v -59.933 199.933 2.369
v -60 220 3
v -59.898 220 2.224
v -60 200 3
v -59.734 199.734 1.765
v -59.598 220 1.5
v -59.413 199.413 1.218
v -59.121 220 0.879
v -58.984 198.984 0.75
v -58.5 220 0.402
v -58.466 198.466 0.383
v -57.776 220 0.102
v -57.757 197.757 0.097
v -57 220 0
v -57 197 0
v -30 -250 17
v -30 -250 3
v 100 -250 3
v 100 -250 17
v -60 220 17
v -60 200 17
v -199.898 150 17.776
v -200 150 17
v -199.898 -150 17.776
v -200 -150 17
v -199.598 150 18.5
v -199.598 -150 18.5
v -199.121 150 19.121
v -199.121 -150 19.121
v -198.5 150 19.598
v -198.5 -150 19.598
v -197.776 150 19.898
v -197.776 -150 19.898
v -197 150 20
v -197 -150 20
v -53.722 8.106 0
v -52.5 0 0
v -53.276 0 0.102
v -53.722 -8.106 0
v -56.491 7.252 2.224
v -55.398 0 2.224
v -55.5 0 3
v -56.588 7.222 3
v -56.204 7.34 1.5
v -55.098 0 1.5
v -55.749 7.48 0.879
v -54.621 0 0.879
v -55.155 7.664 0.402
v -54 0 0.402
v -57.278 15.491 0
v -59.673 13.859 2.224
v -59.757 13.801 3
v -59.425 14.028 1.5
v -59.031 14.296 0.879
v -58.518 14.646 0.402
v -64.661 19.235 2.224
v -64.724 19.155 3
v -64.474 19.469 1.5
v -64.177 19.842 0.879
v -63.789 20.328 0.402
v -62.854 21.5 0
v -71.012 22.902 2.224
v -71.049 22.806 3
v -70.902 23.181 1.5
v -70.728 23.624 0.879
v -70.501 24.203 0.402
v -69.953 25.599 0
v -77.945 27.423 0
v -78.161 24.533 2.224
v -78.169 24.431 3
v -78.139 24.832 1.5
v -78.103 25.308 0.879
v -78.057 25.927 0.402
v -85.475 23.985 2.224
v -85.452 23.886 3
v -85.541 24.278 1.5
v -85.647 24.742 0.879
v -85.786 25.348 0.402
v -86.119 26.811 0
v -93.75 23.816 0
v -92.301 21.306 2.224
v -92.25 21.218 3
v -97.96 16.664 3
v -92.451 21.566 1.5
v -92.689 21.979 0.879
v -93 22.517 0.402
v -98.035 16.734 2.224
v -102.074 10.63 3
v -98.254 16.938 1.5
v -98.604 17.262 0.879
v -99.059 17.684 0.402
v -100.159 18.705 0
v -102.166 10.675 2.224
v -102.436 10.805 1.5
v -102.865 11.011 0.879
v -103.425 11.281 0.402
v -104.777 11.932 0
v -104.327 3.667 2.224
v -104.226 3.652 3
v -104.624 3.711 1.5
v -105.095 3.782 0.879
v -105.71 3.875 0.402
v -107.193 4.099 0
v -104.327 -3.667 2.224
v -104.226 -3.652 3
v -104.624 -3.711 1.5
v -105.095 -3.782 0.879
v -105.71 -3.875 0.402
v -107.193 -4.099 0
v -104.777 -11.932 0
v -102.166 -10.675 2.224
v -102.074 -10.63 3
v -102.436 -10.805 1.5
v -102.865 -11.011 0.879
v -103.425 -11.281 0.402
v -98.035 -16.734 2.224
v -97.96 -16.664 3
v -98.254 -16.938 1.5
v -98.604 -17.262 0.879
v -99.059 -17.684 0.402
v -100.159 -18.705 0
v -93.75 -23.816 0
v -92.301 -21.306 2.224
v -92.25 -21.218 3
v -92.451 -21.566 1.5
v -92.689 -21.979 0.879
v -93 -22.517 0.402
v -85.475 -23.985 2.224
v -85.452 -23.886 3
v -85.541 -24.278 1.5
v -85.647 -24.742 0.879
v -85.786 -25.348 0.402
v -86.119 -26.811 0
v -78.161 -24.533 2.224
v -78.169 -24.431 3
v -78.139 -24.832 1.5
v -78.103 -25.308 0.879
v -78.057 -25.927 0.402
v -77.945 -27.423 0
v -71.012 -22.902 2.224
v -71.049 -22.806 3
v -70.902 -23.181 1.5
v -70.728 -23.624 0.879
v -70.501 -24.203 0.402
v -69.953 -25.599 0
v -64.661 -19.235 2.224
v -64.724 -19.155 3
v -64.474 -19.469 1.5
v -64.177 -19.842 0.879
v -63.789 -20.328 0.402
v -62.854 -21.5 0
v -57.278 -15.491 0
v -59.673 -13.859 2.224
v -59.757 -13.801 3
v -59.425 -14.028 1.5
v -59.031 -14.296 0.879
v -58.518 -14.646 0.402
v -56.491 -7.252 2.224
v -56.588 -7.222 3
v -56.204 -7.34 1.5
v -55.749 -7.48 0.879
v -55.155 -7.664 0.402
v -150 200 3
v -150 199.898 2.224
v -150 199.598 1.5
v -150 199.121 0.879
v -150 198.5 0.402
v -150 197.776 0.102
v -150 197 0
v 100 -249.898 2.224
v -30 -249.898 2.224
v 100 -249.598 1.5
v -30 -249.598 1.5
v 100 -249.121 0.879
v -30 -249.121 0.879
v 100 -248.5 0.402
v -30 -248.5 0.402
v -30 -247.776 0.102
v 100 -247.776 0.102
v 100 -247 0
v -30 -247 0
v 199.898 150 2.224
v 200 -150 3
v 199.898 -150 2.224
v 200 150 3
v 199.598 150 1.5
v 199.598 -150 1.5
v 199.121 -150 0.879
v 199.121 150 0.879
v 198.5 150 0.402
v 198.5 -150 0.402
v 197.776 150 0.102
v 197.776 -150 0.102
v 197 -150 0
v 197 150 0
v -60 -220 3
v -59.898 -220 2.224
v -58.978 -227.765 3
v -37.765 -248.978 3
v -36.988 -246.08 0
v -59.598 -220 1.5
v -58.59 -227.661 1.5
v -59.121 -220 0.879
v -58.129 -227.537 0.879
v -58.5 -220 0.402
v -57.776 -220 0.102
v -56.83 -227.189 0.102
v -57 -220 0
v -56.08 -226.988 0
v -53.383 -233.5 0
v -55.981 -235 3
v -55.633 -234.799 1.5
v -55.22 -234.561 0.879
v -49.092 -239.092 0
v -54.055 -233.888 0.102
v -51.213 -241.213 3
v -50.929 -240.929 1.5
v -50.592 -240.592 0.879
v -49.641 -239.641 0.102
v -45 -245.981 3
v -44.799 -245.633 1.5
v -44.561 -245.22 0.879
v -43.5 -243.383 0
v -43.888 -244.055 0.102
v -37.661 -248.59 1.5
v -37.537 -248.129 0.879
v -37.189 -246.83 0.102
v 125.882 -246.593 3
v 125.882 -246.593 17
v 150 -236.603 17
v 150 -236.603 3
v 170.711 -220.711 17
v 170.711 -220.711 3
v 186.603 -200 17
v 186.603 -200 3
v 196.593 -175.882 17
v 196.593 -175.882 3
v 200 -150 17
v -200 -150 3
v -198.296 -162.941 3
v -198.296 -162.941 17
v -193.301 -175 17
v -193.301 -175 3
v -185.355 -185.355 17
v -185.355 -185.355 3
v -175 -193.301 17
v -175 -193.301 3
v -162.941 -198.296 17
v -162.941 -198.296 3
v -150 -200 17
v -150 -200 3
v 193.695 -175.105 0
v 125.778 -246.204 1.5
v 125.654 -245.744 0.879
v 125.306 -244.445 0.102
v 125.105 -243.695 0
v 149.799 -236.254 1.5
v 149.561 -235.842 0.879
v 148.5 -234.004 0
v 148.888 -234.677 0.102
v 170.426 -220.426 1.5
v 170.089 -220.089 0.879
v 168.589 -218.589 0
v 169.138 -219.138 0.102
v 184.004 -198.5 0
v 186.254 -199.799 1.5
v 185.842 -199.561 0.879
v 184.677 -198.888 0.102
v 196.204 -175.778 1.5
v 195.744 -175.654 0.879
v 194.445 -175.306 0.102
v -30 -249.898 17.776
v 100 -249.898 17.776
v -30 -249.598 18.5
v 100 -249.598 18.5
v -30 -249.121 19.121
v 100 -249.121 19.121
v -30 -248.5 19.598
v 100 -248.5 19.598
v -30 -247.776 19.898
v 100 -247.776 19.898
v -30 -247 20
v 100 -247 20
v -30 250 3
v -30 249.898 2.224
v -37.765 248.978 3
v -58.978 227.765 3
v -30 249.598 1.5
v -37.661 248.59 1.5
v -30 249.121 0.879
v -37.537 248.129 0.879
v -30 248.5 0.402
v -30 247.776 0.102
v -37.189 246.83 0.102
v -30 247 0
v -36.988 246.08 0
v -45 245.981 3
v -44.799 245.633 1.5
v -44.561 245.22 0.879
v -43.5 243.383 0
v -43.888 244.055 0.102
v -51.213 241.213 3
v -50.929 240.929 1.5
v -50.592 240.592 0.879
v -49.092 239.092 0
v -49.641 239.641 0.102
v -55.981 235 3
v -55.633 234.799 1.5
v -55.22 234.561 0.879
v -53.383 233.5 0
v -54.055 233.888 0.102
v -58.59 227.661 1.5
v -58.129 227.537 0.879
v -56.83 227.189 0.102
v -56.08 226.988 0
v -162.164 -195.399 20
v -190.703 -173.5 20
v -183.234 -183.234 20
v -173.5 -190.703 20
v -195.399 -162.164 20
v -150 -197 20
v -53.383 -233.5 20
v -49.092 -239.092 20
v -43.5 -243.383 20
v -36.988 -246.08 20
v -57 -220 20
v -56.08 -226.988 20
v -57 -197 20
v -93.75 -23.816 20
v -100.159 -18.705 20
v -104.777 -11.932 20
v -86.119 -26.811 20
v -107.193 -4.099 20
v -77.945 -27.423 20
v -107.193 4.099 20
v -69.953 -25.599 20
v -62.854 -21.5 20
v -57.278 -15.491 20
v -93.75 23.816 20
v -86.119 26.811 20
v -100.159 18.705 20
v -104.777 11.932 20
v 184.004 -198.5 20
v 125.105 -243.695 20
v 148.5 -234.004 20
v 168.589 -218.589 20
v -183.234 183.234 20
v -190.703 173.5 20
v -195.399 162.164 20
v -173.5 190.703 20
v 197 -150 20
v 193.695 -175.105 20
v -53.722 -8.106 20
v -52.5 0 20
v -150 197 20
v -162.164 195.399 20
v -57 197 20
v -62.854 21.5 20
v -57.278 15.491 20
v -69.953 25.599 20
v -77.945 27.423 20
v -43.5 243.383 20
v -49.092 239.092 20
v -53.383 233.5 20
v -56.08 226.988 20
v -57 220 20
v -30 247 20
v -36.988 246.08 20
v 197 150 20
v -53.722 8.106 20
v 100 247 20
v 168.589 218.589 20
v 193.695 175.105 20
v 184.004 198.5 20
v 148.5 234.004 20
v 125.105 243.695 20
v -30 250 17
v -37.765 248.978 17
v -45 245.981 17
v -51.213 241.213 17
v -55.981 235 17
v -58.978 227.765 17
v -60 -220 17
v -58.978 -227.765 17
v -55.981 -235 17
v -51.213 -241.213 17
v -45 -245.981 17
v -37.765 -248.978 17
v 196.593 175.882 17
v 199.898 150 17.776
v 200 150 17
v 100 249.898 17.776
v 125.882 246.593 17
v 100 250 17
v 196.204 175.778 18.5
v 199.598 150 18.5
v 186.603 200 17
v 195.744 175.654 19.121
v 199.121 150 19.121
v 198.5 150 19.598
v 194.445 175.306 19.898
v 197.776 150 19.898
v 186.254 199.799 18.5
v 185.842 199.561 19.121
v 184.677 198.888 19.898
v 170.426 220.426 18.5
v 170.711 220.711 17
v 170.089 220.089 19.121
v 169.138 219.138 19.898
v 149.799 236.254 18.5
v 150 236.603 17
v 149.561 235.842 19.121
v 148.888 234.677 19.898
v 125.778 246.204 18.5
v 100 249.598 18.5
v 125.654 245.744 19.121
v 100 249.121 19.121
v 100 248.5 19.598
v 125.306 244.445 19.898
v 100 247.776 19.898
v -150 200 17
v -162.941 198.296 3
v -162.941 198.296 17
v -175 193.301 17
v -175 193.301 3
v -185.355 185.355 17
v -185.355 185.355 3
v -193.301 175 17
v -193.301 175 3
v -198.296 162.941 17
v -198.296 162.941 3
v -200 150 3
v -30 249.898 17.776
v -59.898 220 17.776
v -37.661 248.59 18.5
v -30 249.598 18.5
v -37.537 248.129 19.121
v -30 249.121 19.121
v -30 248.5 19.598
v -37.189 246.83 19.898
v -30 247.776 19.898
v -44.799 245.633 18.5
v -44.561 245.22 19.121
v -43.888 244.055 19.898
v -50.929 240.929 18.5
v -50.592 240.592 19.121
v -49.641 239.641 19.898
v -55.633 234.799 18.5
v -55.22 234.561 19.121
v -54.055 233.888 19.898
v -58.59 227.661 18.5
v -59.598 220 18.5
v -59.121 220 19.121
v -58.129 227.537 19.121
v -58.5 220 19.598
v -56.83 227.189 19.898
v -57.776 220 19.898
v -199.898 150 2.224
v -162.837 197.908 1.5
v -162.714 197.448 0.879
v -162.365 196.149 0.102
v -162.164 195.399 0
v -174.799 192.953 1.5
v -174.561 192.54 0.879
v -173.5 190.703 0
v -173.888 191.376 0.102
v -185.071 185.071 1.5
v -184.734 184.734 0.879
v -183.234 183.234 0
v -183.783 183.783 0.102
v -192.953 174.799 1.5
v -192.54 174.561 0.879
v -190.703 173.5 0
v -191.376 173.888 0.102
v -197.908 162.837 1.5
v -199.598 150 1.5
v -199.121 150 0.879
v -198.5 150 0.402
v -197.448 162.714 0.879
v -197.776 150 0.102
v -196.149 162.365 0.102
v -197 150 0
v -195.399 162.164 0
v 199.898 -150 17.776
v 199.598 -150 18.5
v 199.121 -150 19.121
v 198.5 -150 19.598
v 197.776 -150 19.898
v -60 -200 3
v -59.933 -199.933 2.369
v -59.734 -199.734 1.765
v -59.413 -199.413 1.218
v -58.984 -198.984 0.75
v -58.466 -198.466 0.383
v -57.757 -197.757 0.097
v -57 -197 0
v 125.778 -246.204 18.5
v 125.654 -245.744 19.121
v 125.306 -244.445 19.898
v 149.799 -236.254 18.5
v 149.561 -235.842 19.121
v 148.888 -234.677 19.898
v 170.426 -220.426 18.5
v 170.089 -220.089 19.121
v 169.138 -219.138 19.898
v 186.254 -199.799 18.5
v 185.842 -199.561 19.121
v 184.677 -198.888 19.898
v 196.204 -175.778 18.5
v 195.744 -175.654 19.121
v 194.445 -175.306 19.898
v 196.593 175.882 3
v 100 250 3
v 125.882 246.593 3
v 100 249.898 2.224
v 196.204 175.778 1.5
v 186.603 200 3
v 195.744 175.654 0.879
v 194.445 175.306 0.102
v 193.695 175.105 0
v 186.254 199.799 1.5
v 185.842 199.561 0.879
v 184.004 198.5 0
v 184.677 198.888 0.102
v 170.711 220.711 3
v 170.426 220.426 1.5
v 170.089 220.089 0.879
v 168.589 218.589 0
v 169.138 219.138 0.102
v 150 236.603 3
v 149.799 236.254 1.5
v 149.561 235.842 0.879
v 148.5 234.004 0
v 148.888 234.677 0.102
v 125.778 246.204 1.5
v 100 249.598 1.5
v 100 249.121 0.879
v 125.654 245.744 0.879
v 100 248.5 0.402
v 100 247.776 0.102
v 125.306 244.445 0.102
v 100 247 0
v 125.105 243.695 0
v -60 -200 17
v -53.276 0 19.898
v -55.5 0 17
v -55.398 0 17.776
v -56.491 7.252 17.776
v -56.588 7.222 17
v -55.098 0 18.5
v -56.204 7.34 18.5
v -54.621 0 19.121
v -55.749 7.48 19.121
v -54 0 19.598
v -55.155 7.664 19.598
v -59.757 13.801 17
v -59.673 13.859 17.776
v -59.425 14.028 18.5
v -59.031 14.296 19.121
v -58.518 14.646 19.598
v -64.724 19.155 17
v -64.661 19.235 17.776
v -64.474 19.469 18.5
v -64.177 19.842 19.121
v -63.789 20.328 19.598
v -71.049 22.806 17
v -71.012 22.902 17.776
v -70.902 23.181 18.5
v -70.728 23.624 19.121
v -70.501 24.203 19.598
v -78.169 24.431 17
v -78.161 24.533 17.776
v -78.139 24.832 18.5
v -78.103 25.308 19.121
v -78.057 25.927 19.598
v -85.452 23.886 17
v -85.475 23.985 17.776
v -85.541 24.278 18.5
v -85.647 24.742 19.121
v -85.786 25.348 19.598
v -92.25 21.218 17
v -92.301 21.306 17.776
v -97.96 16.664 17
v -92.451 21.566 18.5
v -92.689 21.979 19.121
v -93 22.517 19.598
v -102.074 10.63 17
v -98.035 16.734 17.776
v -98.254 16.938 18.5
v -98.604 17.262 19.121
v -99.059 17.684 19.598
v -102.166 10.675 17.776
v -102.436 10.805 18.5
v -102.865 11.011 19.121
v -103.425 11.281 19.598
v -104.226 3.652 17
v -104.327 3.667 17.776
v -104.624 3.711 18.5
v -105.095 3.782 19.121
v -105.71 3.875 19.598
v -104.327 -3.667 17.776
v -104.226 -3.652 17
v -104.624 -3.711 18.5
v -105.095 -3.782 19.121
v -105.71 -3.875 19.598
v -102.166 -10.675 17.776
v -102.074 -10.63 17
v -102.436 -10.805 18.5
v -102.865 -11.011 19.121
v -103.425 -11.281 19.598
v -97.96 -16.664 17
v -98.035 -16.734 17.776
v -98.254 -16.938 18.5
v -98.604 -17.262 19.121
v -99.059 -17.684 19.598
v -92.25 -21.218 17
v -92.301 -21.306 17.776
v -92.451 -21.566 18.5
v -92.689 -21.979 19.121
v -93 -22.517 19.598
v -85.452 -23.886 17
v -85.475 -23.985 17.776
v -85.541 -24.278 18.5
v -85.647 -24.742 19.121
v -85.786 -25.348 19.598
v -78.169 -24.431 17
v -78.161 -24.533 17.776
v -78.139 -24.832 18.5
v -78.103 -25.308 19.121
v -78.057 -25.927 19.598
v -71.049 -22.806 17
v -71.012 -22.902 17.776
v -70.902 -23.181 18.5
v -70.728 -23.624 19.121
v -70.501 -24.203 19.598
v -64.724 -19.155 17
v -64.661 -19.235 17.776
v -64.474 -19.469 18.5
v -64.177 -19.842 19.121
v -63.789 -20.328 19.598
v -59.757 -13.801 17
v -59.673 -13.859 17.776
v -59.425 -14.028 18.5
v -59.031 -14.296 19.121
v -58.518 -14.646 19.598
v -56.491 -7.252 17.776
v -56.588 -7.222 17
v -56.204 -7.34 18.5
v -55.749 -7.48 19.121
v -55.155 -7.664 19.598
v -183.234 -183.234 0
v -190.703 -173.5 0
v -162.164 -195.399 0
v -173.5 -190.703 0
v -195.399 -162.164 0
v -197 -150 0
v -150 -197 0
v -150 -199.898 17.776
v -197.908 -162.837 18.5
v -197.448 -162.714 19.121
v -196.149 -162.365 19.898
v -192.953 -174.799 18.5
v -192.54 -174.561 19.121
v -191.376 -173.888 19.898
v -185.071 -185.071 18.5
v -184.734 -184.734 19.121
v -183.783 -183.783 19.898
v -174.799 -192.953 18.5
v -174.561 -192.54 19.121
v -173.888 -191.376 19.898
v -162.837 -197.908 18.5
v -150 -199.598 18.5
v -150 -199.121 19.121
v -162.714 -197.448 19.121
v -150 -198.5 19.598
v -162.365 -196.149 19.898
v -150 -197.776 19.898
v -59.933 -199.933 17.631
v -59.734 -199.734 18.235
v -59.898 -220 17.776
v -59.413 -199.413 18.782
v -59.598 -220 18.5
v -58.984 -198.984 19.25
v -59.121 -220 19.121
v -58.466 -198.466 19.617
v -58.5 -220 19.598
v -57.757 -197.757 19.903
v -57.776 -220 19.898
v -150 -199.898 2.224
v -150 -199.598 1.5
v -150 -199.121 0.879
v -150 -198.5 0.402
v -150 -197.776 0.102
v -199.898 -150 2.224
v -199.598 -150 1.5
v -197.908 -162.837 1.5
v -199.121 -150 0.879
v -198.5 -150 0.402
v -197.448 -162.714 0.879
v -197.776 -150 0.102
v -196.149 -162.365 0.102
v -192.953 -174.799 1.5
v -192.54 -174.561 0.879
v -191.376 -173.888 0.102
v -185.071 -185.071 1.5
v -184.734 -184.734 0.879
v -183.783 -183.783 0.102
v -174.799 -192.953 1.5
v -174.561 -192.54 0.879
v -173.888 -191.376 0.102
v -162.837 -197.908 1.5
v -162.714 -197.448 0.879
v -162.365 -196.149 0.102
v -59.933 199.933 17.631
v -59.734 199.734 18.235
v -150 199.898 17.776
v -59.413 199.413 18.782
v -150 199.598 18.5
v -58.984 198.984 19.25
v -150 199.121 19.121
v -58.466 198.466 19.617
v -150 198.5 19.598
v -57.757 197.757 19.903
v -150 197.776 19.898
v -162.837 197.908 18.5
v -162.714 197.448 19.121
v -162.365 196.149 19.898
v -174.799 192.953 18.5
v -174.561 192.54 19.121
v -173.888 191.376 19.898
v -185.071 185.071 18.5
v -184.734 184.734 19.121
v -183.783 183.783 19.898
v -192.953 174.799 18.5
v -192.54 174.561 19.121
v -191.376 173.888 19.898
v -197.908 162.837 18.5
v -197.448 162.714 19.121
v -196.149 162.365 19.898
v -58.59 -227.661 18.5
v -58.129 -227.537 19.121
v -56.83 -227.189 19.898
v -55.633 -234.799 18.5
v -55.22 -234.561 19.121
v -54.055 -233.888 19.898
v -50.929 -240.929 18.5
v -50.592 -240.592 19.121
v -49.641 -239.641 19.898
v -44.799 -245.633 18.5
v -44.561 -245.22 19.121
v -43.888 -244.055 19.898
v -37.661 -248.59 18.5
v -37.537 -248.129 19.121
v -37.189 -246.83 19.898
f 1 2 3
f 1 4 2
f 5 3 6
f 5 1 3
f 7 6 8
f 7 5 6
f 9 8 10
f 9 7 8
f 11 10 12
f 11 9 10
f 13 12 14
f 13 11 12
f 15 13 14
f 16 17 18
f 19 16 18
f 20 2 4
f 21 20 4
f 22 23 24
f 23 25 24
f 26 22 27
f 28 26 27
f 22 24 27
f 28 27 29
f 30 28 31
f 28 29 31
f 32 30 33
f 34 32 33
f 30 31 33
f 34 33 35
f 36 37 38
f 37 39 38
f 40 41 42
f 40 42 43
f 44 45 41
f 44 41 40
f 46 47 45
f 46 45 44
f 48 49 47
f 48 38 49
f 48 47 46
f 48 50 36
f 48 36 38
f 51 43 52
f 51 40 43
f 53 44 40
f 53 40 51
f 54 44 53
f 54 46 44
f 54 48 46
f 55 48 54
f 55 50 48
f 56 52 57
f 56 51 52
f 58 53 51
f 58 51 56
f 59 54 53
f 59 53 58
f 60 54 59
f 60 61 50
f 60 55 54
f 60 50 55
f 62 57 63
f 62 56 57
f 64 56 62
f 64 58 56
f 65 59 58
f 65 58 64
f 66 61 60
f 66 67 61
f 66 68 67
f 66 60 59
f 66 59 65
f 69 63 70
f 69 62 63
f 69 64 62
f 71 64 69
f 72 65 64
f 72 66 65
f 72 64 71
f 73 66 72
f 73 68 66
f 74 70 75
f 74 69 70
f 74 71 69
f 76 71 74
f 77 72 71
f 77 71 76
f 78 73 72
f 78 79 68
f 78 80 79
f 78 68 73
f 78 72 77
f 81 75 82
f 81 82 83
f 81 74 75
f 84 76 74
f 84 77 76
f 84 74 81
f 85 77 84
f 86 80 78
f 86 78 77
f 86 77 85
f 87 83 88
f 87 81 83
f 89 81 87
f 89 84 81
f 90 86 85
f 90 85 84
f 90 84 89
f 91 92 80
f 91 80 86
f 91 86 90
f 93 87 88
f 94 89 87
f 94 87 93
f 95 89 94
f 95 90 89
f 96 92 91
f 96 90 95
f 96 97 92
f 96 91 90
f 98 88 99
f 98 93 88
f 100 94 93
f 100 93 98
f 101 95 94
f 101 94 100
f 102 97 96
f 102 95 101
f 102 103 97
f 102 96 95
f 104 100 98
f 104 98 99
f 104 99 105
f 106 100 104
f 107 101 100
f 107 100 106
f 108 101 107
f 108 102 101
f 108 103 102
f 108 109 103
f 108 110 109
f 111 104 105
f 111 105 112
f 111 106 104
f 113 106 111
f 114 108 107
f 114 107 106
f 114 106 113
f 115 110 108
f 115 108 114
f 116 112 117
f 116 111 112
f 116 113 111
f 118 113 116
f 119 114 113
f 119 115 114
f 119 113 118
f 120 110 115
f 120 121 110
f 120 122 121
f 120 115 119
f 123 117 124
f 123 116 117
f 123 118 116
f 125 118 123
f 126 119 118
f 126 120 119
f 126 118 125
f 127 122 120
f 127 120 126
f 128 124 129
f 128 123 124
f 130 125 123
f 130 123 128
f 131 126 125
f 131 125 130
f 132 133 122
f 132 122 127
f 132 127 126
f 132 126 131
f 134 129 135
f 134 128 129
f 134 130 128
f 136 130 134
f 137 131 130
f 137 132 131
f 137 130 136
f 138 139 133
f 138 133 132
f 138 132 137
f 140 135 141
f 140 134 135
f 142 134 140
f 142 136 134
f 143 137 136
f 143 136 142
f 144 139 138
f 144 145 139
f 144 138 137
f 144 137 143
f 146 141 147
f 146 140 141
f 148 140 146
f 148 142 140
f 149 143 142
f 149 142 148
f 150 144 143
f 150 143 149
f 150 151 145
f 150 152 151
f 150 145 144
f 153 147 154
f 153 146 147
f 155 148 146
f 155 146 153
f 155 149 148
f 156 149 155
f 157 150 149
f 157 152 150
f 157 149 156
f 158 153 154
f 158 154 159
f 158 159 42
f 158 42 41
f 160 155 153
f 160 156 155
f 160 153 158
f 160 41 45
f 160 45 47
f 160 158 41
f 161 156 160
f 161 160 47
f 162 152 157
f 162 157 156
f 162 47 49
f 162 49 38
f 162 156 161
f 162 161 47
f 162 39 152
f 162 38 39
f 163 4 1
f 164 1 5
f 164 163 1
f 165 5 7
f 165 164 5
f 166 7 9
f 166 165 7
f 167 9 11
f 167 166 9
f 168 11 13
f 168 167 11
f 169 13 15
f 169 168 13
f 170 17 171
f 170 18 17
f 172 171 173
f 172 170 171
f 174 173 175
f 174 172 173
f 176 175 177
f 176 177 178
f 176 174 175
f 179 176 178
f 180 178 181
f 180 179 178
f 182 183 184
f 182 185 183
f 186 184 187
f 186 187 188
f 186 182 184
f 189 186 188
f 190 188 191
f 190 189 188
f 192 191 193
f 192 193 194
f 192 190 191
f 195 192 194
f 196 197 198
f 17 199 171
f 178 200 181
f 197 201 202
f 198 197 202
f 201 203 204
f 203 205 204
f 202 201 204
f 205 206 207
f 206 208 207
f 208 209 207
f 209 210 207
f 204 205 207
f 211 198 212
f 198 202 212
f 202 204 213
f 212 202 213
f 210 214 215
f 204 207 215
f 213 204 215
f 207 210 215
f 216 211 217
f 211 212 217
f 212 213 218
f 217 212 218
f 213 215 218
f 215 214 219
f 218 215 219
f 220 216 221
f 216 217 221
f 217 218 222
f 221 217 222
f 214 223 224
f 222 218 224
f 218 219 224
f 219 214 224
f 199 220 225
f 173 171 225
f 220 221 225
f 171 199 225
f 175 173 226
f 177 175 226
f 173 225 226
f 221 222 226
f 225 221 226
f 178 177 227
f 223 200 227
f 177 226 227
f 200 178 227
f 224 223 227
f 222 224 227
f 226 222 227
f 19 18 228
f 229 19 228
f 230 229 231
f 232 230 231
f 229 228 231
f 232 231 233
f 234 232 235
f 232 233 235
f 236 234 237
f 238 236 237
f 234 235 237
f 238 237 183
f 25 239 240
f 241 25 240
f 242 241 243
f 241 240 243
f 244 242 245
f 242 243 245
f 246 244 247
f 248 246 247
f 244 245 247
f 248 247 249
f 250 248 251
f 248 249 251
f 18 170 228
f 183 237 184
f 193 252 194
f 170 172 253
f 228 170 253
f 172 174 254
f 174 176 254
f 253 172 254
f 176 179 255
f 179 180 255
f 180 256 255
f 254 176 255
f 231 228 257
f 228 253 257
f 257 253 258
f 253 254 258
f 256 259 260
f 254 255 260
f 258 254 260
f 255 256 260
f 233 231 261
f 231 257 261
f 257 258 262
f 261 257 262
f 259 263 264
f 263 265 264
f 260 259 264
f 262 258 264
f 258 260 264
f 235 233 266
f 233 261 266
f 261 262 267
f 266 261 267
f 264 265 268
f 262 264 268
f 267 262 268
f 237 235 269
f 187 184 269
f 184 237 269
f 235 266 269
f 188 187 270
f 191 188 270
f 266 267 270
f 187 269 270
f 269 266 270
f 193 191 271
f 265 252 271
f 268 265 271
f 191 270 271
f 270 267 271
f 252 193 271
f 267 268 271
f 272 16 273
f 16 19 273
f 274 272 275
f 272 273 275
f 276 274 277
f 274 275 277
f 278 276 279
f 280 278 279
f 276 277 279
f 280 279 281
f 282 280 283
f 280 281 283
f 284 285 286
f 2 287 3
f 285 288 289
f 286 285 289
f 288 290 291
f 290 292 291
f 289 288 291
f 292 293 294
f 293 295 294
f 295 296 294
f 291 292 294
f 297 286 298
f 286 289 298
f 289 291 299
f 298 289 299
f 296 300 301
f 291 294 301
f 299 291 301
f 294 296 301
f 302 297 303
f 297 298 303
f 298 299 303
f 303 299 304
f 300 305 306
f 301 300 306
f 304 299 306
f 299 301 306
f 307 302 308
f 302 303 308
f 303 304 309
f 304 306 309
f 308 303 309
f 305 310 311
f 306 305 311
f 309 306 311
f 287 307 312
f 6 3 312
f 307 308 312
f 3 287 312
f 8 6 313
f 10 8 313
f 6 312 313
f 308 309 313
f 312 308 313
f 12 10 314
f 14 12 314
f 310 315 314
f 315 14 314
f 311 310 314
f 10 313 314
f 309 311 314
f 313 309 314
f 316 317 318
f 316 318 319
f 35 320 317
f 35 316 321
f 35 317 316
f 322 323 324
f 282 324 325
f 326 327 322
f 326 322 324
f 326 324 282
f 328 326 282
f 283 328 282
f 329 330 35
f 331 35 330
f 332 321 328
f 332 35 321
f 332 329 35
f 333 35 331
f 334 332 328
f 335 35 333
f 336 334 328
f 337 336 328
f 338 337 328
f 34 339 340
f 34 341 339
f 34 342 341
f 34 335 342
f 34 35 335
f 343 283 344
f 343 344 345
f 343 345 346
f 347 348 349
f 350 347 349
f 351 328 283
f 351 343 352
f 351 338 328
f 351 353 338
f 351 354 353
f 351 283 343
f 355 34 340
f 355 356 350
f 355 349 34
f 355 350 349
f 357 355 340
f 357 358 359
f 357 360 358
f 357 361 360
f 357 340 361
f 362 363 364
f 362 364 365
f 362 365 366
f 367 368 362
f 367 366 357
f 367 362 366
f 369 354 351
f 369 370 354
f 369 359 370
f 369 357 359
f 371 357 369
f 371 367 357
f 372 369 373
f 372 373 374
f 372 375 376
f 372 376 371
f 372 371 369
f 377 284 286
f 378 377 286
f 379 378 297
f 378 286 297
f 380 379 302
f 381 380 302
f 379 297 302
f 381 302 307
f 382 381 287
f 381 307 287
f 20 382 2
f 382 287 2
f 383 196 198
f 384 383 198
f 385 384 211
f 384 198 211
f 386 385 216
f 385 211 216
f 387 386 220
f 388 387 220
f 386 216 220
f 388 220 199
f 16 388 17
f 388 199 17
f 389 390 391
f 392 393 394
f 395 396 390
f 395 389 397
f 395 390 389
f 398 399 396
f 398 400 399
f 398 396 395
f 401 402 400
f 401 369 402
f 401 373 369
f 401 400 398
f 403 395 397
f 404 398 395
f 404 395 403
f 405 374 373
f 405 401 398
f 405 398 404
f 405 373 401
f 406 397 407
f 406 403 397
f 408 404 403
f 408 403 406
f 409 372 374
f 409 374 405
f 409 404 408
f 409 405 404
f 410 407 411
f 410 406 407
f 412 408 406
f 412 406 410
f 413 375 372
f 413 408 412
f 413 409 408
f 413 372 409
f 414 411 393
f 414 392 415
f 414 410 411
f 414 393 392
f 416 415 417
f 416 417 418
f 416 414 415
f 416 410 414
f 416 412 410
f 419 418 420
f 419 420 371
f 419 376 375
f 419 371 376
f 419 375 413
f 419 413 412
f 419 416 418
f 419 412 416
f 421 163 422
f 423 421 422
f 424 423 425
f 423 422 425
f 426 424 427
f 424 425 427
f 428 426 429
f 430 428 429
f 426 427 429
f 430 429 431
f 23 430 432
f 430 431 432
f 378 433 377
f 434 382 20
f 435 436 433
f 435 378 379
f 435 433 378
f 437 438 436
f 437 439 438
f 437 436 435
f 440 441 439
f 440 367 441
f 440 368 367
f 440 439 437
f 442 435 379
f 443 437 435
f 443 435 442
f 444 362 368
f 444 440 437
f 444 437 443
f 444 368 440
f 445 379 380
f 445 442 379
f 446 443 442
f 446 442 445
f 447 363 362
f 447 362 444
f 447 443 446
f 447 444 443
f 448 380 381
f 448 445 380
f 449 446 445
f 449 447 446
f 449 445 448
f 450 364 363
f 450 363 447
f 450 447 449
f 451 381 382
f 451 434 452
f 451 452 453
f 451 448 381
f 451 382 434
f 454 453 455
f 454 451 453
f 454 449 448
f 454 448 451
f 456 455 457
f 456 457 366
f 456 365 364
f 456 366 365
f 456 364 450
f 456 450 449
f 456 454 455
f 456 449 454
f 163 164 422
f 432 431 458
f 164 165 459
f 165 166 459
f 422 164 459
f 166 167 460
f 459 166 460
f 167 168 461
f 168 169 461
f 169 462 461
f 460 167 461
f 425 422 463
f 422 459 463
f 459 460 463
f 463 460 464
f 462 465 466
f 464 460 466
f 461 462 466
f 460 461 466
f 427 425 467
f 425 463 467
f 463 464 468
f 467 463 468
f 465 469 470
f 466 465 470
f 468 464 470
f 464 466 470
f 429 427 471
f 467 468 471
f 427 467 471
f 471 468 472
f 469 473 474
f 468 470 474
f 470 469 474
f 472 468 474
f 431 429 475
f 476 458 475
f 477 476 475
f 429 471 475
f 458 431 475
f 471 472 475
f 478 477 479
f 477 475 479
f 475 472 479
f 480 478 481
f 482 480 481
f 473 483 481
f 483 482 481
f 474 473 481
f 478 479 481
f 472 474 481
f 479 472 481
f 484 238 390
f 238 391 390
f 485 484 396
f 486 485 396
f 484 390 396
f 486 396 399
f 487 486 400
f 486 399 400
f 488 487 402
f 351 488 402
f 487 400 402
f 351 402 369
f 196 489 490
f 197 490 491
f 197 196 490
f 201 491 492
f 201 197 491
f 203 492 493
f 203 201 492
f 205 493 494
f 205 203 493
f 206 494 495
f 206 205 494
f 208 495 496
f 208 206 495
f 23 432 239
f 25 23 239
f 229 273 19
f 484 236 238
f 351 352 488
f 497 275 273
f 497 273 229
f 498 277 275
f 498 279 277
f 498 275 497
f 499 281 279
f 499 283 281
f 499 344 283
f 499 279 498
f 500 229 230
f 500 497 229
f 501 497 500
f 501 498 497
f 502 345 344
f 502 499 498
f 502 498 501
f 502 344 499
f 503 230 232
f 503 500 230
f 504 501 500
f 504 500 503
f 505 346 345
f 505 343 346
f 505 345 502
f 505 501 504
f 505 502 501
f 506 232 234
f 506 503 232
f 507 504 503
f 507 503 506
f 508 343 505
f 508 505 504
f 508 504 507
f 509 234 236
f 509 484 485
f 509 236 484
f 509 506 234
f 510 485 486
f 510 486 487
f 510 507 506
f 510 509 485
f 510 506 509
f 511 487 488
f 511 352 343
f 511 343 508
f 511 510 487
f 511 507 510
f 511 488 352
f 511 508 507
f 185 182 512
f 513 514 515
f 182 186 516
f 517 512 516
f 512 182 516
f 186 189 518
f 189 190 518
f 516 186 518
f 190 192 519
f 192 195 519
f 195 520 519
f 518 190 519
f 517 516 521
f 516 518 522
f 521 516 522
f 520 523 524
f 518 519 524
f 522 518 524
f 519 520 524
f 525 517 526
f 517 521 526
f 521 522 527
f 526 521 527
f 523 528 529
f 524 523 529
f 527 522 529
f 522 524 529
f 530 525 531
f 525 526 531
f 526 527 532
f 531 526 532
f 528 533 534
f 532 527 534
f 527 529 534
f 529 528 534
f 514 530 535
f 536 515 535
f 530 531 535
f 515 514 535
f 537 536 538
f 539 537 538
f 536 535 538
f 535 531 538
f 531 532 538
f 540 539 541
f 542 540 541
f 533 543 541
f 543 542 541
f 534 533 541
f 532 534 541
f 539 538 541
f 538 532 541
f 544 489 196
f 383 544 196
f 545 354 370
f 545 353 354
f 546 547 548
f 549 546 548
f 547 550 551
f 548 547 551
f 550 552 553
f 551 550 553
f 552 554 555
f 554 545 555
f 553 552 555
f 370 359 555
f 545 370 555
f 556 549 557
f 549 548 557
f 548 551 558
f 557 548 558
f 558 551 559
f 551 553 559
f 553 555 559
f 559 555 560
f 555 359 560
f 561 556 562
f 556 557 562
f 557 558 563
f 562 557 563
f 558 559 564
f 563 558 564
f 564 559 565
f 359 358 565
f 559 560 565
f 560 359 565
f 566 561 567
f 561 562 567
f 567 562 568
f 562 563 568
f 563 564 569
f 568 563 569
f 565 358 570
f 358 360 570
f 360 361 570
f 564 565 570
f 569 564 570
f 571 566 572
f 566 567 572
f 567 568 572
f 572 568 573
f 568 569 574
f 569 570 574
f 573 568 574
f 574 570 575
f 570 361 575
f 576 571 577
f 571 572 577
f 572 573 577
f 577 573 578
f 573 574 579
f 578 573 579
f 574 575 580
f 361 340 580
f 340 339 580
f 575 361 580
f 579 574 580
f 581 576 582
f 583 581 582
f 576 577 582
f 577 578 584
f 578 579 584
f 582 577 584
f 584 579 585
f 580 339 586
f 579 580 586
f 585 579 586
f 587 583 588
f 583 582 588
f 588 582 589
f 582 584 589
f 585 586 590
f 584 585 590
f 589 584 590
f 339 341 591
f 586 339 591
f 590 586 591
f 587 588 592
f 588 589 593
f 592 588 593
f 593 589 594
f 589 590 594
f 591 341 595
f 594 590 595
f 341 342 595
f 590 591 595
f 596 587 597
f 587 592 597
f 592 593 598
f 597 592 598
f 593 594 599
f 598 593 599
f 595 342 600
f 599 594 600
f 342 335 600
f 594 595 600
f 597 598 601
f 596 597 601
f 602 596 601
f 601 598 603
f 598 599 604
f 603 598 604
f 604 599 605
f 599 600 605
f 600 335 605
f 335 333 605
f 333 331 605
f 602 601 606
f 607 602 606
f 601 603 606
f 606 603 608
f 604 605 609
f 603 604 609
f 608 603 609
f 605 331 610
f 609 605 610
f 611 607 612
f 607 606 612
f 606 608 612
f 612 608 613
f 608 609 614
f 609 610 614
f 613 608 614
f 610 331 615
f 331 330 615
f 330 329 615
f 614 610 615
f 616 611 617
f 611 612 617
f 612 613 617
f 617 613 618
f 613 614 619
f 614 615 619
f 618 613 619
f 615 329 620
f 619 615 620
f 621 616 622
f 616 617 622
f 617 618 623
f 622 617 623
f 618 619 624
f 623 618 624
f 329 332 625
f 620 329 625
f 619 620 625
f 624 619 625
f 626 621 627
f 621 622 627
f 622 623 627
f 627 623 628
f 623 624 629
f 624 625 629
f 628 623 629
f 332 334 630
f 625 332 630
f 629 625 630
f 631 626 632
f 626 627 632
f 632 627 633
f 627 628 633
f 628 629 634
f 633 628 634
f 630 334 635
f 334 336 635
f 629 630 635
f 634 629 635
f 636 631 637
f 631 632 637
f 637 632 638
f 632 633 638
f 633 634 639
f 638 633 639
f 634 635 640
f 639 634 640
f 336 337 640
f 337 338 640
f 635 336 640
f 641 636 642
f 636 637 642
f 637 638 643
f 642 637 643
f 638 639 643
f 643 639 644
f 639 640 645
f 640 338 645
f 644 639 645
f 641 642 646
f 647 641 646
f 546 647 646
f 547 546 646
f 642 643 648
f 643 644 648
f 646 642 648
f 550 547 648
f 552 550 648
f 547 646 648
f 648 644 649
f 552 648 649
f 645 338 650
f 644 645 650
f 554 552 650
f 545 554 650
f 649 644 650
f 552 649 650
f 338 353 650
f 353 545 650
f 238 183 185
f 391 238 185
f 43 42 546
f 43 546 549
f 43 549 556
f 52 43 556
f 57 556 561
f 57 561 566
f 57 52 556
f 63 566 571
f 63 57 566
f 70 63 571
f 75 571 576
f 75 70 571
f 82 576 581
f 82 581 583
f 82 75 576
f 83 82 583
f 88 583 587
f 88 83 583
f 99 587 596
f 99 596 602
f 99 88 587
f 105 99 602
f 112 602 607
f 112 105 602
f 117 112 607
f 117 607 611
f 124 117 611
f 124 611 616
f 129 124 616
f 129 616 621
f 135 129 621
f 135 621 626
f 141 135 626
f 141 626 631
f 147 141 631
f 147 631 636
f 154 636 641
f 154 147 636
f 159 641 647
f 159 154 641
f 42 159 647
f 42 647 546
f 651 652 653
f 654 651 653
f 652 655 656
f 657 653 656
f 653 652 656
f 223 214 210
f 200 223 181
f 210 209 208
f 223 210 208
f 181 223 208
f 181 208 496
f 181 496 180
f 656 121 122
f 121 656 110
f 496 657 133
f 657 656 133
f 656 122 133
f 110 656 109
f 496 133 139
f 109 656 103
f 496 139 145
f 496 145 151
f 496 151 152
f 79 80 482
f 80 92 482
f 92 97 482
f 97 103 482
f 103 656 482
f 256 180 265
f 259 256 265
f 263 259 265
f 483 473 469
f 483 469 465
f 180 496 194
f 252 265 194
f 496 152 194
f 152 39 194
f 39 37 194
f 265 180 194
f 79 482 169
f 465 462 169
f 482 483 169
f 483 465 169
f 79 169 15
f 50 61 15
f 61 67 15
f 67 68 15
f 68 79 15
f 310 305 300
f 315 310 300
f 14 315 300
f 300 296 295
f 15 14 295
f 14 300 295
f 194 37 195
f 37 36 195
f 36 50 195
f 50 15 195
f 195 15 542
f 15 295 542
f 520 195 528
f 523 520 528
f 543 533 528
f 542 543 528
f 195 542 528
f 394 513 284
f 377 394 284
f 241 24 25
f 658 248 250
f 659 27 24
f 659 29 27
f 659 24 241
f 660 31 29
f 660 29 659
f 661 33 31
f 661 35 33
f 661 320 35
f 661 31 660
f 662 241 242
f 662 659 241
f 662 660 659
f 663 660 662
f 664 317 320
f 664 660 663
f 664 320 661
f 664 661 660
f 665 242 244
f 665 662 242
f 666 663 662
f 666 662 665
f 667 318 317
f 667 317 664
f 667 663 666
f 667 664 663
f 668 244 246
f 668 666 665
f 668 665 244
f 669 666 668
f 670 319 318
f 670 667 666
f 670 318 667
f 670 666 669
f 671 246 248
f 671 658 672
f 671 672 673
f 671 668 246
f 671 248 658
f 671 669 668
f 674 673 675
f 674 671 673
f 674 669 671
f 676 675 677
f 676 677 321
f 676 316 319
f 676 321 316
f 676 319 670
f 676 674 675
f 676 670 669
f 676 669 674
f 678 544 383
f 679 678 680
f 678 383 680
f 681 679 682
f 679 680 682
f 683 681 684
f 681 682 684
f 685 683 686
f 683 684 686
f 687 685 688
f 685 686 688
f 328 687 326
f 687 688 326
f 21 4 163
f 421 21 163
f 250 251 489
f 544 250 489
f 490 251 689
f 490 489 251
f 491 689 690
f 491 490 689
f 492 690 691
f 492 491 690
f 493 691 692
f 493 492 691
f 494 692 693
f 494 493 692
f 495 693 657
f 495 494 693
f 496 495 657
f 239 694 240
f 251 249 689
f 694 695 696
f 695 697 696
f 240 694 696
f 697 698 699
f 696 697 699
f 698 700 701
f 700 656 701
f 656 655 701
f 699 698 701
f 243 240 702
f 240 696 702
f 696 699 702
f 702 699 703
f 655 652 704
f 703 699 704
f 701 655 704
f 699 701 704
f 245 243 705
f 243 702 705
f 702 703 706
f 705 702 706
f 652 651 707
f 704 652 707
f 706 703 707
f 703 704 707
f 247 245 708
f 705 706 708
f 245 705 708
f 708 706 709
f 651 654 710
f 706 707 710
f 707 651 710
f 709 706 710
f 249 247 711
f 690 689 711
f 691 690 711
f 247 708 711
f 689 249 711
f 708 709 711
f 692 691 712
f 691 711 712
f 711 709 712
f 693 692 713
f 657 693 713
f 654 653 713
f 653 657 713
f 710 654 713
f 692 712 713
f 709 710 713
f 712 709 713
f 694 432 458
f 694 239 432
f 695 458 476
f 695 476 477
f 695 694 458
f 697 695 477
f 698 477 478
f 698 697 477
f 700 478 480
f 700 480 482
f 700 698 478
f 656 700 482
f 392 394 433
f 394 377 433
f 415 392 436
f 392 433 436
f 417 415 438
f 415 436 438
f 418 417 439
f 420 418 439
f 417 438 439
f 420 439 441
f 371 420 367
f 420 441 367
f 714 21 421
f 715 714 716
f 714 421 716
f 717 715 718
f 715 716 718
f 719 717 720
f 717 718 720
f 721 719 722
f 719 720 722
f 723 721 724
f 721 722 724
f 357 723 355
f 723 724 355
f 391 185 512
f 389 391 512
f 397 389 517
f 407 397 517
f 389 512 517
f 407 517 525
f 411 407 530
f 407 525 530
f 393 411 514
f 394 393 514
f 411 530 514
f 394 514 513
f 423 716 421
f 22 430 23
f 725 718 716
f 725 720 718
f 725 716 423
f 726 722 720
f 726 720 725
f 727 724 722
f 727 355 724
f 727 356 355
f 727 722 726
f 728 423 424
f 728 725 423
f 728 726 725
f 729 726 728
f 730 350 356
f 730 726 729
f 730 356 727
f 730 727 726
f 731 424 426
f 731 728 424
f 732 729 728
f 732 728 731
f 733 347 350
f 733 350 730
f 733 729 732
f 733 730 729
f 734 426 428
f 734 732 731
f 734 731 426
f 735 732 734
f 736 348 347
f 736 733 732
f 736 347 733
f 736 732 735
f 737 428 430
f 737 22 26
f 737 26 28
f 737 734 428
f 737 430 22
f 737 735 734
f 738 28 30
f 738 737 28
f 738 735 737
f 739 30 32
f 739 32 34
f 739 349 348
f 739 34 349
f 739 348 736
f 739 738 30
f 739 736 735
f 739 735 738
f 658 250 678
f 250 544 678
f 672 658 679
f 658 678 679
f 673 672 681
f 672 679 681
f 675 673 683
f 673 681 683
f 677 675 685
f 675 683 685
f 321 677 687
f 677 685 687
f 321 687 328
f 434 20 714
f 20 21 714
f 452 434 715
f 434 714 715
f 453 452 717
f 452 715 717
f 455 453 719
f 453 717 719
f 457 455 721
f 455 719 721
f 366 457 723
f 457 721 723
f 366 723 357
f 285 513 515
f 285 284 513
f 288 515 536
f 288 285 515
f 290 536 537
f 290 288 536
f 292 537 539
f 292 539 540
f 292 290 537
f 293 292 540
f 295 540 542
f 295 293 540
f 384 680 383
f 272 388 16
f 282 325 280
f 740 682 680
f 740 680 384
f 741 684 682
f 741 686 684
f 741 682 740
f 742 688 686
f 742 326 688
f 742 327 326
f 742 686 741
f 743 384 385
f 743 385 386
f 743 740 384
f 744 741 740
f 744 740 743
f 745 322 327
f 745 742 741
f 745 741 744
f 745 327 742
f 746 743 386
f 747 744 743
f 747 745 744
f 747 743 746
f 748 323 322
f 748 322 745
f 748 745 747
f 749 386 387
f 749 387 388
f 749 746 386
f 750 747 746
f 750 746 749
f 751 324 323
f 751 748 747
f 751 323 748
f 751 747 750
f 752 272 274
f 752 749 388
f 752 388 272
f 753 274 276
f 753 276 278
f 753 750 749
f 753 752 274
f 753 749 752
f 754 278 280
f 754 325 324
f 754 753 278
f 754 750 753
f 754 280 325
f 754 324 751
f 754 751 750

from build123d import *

# Parameters (mm, degrees)
F0_R     = 24.5
F1_DEPTH = 20
F2_R     = 3


with BuildPart() as f1:
    # F0 (on Top) → F1 (new body)
    with BuildSketch(Plane.XY):
        with BuildLine():
            Line((-30, -250), (100, -250))
            ThreePointArc((100, -250), (170.710678, -220.710678), (200, -150))
            Line((200, -150), (200, 150))
            ThreePointArc((200, 150), (170.710678, 220.710678), (100, 250))
            Line((100, 250), (-30, 250))
            ThreePointArc((-30, 250), (-51.213203, 241.213203), (-60, 220))
            Line((-60, 220), (-60, 200))
            Line((-60, 200), (-150, 200))
            ThreePointArc((-150, 200), (-185.355339, 185.355339), (-200, 150))
            Line((-200, 150), (-200, -150))
            ThreePointArc((-200, -150), (-185.355339, -185.355339), (-150, -200))
            Line((-150, -200), (-60, -200))
            Line((-60, -200), (-60, -220))
            ThreePointArc((-60, -220), (-51.213203, -241.213203), (-30, -250))
        make_face()
        with Locations((-80, 0)):
            Circle(F0_R, mode=Mode.SUBTRACT)
    extrude(amount=F1_DEPTH)

    # F2
    f2_edges = [f1.edges().sort_by_distance(p)[0] for p in [
        (-185.355339, -185.355339, 20),
        (-105, -200, 20),
        (-60, -210, 20),
        (-51.213203, -241.213203, 20),
        (35, -250, 20),
        (170.710678, -220.710678, 20),
        (200, 0, 20),
        (170.710678, 220.710678, 20),
        (35, 250, 20),
        (-51.213203, 241.213203, 20),
        (-60, 210, 20),
        (-105, 200, 20),
        (-185.355339, 185.355339, 20),
        (-200, 0, 20),
        (-104.5, 0, 20),
        (-185.355339, -185.355339, 0),
        (-105, -200, 0),
        (-60, -210, 0),
        (-51.213203, -241.213203, 0),
        (35, -250, 0),
        (170.710678, -220.710678, 0),
        (200, 0, 0),
        (170.710678, 220.710678, 0),
        (35, 250, 0),
        (-51.213203, 241.213203, 0),
        (-60, 210, 0),
        (-105, 200, 0),
        (-185.355339, 185.355339, 0),
        (-200, 0, 0),
        (-104.5, 0, 0),
    ]]
    fillet(f2_edges, radius=F2_R)


solid = f1.part
